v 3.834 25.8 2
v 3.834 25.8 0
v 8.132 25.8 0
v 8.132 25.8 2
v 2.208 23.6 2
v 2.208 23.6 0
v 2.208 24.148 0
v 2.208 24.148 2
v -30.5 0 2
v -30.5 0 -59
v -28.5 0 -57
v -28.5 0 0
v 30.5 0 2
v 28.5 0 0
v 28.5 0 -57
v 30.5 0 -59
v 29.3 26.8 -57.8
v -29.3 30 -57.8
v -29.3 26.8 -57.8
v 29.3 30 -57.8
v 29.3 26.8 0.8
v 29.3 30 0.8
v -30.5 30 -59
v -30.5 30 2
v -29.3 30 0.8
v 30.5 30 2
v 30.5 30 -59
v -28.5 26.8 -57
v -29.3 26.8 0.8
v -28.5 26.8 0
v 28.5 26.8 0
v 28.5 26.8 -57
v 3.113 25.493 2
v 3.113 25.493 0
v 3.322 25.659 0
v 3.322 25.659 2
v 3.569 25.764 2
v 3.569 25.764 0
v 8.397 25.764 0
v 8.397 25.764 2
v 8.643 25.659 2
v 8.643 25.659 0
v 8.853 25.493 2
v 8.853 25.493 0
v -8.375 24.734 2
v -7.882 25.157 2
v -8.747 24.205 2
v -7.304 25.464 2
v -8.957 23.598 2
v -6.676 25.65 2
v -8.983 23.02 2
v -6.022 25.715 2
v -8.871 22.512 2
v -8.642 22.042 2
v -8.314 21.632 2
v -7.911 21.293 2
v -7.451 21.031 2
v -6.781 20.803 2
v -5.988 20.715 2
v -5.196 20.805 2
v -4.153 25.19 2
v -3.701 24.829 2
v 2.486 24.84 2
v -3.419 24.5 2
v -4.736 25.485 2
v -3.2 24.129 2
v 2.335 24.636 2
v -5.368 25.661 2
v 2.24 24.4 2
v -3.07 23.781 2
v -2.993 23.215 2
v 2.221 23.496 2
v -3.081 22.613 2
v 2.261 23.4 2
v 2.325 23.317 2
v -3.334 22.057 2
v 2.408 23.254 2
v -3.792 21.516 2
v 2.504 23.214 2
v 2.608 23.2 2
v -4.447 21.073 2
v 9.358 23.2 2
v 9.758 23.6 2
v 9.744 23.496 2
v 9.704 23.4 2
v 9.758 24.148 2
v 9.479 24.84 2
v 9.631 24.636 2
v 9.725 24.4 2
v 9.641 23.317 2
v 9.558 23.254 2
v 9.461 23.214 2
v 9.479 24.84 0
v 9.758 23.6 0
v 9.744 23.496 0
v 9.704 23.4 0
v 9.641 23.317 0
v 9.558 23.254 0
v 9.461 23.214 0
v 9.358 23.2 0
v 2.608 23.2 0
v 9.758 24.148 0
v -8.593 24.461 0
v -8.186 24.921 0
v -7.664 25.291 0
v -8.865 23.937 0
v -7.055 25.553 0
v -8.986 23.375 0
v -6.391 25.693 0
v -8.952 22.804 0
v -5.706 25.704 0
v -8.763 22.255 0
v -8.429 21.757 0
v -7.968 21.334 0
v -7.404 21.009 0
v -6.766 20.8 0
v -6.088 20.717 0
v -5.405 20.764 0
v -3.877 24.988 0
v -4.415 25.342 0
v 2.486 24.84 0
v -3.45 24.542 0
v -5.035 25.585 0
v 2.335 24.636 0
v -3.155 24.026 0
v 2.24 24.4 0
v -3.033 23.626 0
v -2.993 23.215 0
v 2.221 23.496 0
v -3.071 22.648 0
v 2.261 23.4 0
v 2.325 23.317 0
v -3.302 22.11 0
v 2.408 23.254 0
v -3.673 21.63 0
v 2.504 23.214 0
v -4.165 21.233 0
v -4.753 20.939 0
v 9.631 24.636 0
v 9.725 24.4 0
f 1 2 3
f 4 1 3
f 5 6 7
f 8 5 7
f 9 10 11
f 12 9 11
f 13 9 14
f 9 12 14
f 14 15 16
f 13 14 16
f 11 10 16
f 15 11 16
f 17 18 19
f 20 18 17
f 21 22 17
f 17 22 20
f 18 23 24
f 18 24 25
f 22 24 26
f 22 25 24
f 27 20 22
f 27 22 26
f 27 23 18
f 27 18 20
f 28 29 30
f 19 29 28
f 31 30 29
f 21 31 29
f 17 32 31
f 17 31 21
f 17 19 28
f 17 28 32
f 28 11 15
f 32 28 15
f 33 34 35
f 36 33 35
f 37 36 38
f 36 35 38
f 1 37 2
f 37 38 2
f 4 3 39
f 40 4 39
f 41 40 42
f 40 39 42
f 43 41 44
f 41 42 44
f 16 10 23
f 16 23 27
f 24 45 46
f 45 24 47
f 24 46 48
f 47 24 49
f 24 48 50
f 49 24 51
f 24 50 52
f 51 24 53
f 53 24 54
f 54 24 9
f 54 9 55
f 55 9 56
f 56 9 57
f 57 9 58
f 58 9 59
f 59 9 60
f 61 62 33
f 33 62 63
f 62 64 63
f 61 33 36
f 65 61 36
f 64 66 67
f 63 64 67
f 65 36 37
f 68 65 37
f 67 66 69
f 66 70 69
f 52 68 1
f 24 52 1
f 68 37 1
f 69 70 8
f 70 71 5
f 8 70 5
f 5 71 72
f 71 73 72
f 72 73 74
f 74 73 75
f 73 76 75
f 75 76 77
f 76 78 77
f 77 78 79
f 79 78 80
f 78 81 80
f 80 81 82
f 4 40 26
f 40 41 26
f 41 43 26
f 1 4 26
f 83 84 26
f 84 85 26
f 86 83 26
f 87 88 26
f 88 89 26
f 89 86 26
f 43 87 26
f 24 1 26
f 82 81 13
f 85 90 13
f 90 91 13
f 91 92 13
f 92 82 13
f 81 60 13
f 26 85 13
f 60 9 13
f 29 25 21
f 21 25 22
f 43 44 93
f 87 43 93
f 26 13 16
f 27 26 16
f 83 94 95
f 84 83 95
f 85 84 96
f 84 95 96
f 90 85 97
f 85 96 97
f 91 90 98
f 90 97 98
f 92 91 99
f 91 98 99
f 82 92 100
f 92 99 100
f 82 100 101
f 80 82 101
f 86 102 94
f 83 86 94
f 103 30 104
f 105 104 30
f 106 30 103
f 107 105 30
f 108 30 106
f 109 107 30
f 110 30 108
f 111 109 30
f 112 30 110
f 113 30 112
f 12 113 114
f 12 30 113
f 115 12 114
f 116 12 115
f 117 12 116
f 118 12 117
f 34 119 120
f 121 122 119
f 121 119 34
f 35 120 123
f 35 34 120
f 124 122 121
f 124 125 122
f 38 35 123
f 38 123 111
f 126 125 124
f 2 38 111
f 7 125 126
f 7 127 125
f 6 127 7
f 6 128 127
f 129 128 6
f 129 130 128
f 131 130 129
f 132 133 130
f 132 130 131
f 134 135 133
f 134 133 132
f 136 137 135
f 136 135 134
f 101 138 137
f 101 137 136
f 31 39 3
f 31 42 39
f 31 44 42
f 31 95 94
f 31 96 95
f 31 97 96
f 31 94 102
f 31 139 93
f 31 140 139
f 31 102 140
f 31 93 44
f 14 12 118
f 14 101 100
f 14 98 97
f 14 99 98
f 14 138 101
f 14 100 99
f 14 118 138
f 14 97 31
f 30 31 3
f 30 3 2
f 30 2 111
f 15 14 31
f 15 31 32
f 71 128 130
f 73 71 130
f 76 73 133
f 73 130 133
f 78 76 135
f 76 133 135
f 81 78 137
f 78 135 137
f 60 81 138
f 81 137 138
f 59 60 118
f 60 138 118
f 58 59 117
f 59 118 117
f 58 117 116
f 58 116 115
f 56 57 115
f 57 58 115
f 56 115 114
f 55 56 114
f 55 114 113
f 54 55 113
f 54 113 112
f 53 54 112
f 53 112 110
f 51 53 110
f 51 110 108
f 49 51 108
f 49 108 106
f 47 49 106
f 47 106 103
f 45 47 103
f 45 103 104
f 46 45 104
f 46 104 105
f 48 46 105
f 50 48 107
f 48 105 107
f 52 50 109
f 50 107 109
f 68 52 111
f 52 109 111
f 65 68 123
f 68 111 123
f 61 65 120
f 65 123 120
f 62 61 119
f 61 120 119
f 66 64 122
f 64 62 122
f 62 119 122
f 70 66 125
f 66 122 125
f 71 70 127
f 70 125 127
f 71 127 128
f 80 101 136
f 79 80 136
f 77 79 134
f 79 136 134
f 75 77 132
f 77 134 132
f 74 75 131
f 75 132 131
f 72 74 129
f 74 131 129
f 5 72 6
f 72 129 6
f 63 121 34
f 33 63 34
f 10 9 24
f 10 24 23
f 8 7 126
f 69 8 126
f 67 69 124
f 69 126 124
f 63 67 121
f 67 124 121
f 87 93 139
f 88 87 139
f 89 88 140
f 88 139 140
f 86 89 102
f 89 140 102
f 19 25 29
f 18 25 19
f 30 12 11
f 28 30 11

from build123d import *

# Parameters (mm, degrees)
SKETCH1_W           = 61
SKETCH1_H           = 61
SKETCH1_W_2         = 57
SKETCH1_H_2         = 57
BOSS_EXTRUDE2_DEPTH = 30
SKETCH2_W           = 58.6
SKETCH2_H           = 58.6
CUT_EXTRUDE1_DEPTH  = 3.2
SKETCH4_RX          = 3
SKETCH4_RY          = 2.5
CUT_EXTRUDE2_DEPTH  = 73.878323252


with BuildPart() as part:
    # Sketch1 → Boss-Extrude2 (new body)
    with BuildSketch(Plane(origin=(0, 0, 0), x_dir=(1, 0, 0), z_dir=(0, 1, 0))):
        with Locations((0, 28.5)):
            Rectangle(SKETCH1_W, SKETCH1_H)
        with Locations((0, 28.5)):
            Rectangle(SKETCH1_W_2, SKETCH1_H_2, mode=Mode.SUBTRACT)
    extrude(amount=BOSS_EXTRUDE2_DEPTH)

    # Sketch2 → Cut-Extrude1 (cut)
    with BuildSketch(Plane(origin=(0, 30, 0), x_dir=(1, 0, 0), z_dir=(0, 1, 0))):
        with Locations((0, 28.5)):
            Rectangle(SKETCH2_W, SKETCH2_H)
    extrude(amount=-CUT_EXTRUDE1_DEPTH, mode=Mode.SUBTRACT)

    # Sketch4 → Cut-Extrude2 (cut, through all)
    with BuildSketch(Plane(origin=(0, 0, 0), x_dir=(-1, 0, 0), z_dir=(0, 0, -1))):
        with BuildLine():
            Line((-5.98277454, 23.2), (-5.98277454, 25.8))
            Line((-5.98277454, 25.8), (-8.131556664, 25.8))
            ThreePointArc((-8.131556664, 25.8), (-8.523646049, 25.719927124), (-8.852943985, 25.492531828))
            Line((-8.852943985, 25.492531828), (-9.479161861, 24.840221541))
            ThreePointArc((-9.479161861, 24.840221541), (-9.685510311, 24.520927357), (-9.75777454, 24.147689712))
            Line((-9.75777454, 24.147689712), (-9.75777454, 23.6))
            ThreePointArc((-9.75777454, 23.6), (-9.640617252, 23.317157288), (-9.35777454, 23.2))
            Line((-9.35777454, 23.2), (-5.98277454, 23.2))
        make_face()
        with BuildLine():
            Line((-3.833992416, 25.8), (-5.98277454, 25.8))
            Line((-5.98277454, 25.8), (-5.98277454, 23.2))
            Line((-5.98277454, 23.2), (-2.60777454, 23.2))
            ThreePointArc((-2.60777454, 23.2), (-2.324931828, 23.317157288), (-2.20777454, 23.6))
            Line((-2.20777454, 23.6), (-2.20777454, 24.147689712))
            ThreePointArc((-2.20777454, 24.147689712), (-2.280038769, 24.520927357), (-2.486387219, 24.840221541))
            Line((-2.486387219, 24.840221541), (-3.112605095, 25.492531828))
            ThreePointArc((-3.112605095, 25.492531828), (-3.441903031, 25.719927124), (-3.833992416, 25.8))
        make_face()
        with Locations(Location((5.992555786, 23.215339324), (0, 0, 180))):
            Ellipse(SKETCH4_RX, SKETCH4_RY)
    extrude(amount=-CUT_EXTRUDE2_DEPTH, mode=Mode.SUBTRACT)


solid = part.part
